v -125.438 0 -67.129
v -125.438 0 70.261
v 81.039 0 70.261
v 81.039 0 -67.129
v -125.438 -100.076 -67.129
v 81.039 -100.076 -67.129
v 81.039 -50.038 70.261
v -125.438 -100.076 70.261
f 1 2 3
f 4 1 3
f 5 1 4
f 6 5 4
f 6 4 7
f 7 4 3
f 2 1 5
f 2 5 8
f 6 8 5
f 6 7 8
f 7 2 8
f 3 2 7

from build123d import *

# Parameters (mm, degrees)
F0_W     = 206.4777240157
F0_H     = 137.3893991113
F1_DEPTH = 100.076
F5_DEPTH = 45.8442839212


with BuildPart() as f1:
    # F0 (on Front) → F1 (new body)
    with BuildSketch(Plane.XZ):
        with Locations((-22.1995897591, 1.5661381185)):
            Rectangle(F0_W, F0_H)
    extrude(amount=F1_DEPTH)

    # F4 (on 3pt) → F5 (cut, through all)
    with BuildSketch(Plane(origin=(19.3784317983, -79.9635175807, 29.1231675703), x_dir=(-0.975040899, -0.208619769, 0.0759805056), z_dir=(-0.2220253257, 0.9161693897, -0.3336740987))):
        Polygon((-63.2392349005, 48.8948148407), (-63.2392349005, -97.3229967698), (148.5239067524, 31.7710361682), align=None)
    extrude(amount=-F5_DEPTH, mode=Mode.SUBTRACT)


solid = f1.part
